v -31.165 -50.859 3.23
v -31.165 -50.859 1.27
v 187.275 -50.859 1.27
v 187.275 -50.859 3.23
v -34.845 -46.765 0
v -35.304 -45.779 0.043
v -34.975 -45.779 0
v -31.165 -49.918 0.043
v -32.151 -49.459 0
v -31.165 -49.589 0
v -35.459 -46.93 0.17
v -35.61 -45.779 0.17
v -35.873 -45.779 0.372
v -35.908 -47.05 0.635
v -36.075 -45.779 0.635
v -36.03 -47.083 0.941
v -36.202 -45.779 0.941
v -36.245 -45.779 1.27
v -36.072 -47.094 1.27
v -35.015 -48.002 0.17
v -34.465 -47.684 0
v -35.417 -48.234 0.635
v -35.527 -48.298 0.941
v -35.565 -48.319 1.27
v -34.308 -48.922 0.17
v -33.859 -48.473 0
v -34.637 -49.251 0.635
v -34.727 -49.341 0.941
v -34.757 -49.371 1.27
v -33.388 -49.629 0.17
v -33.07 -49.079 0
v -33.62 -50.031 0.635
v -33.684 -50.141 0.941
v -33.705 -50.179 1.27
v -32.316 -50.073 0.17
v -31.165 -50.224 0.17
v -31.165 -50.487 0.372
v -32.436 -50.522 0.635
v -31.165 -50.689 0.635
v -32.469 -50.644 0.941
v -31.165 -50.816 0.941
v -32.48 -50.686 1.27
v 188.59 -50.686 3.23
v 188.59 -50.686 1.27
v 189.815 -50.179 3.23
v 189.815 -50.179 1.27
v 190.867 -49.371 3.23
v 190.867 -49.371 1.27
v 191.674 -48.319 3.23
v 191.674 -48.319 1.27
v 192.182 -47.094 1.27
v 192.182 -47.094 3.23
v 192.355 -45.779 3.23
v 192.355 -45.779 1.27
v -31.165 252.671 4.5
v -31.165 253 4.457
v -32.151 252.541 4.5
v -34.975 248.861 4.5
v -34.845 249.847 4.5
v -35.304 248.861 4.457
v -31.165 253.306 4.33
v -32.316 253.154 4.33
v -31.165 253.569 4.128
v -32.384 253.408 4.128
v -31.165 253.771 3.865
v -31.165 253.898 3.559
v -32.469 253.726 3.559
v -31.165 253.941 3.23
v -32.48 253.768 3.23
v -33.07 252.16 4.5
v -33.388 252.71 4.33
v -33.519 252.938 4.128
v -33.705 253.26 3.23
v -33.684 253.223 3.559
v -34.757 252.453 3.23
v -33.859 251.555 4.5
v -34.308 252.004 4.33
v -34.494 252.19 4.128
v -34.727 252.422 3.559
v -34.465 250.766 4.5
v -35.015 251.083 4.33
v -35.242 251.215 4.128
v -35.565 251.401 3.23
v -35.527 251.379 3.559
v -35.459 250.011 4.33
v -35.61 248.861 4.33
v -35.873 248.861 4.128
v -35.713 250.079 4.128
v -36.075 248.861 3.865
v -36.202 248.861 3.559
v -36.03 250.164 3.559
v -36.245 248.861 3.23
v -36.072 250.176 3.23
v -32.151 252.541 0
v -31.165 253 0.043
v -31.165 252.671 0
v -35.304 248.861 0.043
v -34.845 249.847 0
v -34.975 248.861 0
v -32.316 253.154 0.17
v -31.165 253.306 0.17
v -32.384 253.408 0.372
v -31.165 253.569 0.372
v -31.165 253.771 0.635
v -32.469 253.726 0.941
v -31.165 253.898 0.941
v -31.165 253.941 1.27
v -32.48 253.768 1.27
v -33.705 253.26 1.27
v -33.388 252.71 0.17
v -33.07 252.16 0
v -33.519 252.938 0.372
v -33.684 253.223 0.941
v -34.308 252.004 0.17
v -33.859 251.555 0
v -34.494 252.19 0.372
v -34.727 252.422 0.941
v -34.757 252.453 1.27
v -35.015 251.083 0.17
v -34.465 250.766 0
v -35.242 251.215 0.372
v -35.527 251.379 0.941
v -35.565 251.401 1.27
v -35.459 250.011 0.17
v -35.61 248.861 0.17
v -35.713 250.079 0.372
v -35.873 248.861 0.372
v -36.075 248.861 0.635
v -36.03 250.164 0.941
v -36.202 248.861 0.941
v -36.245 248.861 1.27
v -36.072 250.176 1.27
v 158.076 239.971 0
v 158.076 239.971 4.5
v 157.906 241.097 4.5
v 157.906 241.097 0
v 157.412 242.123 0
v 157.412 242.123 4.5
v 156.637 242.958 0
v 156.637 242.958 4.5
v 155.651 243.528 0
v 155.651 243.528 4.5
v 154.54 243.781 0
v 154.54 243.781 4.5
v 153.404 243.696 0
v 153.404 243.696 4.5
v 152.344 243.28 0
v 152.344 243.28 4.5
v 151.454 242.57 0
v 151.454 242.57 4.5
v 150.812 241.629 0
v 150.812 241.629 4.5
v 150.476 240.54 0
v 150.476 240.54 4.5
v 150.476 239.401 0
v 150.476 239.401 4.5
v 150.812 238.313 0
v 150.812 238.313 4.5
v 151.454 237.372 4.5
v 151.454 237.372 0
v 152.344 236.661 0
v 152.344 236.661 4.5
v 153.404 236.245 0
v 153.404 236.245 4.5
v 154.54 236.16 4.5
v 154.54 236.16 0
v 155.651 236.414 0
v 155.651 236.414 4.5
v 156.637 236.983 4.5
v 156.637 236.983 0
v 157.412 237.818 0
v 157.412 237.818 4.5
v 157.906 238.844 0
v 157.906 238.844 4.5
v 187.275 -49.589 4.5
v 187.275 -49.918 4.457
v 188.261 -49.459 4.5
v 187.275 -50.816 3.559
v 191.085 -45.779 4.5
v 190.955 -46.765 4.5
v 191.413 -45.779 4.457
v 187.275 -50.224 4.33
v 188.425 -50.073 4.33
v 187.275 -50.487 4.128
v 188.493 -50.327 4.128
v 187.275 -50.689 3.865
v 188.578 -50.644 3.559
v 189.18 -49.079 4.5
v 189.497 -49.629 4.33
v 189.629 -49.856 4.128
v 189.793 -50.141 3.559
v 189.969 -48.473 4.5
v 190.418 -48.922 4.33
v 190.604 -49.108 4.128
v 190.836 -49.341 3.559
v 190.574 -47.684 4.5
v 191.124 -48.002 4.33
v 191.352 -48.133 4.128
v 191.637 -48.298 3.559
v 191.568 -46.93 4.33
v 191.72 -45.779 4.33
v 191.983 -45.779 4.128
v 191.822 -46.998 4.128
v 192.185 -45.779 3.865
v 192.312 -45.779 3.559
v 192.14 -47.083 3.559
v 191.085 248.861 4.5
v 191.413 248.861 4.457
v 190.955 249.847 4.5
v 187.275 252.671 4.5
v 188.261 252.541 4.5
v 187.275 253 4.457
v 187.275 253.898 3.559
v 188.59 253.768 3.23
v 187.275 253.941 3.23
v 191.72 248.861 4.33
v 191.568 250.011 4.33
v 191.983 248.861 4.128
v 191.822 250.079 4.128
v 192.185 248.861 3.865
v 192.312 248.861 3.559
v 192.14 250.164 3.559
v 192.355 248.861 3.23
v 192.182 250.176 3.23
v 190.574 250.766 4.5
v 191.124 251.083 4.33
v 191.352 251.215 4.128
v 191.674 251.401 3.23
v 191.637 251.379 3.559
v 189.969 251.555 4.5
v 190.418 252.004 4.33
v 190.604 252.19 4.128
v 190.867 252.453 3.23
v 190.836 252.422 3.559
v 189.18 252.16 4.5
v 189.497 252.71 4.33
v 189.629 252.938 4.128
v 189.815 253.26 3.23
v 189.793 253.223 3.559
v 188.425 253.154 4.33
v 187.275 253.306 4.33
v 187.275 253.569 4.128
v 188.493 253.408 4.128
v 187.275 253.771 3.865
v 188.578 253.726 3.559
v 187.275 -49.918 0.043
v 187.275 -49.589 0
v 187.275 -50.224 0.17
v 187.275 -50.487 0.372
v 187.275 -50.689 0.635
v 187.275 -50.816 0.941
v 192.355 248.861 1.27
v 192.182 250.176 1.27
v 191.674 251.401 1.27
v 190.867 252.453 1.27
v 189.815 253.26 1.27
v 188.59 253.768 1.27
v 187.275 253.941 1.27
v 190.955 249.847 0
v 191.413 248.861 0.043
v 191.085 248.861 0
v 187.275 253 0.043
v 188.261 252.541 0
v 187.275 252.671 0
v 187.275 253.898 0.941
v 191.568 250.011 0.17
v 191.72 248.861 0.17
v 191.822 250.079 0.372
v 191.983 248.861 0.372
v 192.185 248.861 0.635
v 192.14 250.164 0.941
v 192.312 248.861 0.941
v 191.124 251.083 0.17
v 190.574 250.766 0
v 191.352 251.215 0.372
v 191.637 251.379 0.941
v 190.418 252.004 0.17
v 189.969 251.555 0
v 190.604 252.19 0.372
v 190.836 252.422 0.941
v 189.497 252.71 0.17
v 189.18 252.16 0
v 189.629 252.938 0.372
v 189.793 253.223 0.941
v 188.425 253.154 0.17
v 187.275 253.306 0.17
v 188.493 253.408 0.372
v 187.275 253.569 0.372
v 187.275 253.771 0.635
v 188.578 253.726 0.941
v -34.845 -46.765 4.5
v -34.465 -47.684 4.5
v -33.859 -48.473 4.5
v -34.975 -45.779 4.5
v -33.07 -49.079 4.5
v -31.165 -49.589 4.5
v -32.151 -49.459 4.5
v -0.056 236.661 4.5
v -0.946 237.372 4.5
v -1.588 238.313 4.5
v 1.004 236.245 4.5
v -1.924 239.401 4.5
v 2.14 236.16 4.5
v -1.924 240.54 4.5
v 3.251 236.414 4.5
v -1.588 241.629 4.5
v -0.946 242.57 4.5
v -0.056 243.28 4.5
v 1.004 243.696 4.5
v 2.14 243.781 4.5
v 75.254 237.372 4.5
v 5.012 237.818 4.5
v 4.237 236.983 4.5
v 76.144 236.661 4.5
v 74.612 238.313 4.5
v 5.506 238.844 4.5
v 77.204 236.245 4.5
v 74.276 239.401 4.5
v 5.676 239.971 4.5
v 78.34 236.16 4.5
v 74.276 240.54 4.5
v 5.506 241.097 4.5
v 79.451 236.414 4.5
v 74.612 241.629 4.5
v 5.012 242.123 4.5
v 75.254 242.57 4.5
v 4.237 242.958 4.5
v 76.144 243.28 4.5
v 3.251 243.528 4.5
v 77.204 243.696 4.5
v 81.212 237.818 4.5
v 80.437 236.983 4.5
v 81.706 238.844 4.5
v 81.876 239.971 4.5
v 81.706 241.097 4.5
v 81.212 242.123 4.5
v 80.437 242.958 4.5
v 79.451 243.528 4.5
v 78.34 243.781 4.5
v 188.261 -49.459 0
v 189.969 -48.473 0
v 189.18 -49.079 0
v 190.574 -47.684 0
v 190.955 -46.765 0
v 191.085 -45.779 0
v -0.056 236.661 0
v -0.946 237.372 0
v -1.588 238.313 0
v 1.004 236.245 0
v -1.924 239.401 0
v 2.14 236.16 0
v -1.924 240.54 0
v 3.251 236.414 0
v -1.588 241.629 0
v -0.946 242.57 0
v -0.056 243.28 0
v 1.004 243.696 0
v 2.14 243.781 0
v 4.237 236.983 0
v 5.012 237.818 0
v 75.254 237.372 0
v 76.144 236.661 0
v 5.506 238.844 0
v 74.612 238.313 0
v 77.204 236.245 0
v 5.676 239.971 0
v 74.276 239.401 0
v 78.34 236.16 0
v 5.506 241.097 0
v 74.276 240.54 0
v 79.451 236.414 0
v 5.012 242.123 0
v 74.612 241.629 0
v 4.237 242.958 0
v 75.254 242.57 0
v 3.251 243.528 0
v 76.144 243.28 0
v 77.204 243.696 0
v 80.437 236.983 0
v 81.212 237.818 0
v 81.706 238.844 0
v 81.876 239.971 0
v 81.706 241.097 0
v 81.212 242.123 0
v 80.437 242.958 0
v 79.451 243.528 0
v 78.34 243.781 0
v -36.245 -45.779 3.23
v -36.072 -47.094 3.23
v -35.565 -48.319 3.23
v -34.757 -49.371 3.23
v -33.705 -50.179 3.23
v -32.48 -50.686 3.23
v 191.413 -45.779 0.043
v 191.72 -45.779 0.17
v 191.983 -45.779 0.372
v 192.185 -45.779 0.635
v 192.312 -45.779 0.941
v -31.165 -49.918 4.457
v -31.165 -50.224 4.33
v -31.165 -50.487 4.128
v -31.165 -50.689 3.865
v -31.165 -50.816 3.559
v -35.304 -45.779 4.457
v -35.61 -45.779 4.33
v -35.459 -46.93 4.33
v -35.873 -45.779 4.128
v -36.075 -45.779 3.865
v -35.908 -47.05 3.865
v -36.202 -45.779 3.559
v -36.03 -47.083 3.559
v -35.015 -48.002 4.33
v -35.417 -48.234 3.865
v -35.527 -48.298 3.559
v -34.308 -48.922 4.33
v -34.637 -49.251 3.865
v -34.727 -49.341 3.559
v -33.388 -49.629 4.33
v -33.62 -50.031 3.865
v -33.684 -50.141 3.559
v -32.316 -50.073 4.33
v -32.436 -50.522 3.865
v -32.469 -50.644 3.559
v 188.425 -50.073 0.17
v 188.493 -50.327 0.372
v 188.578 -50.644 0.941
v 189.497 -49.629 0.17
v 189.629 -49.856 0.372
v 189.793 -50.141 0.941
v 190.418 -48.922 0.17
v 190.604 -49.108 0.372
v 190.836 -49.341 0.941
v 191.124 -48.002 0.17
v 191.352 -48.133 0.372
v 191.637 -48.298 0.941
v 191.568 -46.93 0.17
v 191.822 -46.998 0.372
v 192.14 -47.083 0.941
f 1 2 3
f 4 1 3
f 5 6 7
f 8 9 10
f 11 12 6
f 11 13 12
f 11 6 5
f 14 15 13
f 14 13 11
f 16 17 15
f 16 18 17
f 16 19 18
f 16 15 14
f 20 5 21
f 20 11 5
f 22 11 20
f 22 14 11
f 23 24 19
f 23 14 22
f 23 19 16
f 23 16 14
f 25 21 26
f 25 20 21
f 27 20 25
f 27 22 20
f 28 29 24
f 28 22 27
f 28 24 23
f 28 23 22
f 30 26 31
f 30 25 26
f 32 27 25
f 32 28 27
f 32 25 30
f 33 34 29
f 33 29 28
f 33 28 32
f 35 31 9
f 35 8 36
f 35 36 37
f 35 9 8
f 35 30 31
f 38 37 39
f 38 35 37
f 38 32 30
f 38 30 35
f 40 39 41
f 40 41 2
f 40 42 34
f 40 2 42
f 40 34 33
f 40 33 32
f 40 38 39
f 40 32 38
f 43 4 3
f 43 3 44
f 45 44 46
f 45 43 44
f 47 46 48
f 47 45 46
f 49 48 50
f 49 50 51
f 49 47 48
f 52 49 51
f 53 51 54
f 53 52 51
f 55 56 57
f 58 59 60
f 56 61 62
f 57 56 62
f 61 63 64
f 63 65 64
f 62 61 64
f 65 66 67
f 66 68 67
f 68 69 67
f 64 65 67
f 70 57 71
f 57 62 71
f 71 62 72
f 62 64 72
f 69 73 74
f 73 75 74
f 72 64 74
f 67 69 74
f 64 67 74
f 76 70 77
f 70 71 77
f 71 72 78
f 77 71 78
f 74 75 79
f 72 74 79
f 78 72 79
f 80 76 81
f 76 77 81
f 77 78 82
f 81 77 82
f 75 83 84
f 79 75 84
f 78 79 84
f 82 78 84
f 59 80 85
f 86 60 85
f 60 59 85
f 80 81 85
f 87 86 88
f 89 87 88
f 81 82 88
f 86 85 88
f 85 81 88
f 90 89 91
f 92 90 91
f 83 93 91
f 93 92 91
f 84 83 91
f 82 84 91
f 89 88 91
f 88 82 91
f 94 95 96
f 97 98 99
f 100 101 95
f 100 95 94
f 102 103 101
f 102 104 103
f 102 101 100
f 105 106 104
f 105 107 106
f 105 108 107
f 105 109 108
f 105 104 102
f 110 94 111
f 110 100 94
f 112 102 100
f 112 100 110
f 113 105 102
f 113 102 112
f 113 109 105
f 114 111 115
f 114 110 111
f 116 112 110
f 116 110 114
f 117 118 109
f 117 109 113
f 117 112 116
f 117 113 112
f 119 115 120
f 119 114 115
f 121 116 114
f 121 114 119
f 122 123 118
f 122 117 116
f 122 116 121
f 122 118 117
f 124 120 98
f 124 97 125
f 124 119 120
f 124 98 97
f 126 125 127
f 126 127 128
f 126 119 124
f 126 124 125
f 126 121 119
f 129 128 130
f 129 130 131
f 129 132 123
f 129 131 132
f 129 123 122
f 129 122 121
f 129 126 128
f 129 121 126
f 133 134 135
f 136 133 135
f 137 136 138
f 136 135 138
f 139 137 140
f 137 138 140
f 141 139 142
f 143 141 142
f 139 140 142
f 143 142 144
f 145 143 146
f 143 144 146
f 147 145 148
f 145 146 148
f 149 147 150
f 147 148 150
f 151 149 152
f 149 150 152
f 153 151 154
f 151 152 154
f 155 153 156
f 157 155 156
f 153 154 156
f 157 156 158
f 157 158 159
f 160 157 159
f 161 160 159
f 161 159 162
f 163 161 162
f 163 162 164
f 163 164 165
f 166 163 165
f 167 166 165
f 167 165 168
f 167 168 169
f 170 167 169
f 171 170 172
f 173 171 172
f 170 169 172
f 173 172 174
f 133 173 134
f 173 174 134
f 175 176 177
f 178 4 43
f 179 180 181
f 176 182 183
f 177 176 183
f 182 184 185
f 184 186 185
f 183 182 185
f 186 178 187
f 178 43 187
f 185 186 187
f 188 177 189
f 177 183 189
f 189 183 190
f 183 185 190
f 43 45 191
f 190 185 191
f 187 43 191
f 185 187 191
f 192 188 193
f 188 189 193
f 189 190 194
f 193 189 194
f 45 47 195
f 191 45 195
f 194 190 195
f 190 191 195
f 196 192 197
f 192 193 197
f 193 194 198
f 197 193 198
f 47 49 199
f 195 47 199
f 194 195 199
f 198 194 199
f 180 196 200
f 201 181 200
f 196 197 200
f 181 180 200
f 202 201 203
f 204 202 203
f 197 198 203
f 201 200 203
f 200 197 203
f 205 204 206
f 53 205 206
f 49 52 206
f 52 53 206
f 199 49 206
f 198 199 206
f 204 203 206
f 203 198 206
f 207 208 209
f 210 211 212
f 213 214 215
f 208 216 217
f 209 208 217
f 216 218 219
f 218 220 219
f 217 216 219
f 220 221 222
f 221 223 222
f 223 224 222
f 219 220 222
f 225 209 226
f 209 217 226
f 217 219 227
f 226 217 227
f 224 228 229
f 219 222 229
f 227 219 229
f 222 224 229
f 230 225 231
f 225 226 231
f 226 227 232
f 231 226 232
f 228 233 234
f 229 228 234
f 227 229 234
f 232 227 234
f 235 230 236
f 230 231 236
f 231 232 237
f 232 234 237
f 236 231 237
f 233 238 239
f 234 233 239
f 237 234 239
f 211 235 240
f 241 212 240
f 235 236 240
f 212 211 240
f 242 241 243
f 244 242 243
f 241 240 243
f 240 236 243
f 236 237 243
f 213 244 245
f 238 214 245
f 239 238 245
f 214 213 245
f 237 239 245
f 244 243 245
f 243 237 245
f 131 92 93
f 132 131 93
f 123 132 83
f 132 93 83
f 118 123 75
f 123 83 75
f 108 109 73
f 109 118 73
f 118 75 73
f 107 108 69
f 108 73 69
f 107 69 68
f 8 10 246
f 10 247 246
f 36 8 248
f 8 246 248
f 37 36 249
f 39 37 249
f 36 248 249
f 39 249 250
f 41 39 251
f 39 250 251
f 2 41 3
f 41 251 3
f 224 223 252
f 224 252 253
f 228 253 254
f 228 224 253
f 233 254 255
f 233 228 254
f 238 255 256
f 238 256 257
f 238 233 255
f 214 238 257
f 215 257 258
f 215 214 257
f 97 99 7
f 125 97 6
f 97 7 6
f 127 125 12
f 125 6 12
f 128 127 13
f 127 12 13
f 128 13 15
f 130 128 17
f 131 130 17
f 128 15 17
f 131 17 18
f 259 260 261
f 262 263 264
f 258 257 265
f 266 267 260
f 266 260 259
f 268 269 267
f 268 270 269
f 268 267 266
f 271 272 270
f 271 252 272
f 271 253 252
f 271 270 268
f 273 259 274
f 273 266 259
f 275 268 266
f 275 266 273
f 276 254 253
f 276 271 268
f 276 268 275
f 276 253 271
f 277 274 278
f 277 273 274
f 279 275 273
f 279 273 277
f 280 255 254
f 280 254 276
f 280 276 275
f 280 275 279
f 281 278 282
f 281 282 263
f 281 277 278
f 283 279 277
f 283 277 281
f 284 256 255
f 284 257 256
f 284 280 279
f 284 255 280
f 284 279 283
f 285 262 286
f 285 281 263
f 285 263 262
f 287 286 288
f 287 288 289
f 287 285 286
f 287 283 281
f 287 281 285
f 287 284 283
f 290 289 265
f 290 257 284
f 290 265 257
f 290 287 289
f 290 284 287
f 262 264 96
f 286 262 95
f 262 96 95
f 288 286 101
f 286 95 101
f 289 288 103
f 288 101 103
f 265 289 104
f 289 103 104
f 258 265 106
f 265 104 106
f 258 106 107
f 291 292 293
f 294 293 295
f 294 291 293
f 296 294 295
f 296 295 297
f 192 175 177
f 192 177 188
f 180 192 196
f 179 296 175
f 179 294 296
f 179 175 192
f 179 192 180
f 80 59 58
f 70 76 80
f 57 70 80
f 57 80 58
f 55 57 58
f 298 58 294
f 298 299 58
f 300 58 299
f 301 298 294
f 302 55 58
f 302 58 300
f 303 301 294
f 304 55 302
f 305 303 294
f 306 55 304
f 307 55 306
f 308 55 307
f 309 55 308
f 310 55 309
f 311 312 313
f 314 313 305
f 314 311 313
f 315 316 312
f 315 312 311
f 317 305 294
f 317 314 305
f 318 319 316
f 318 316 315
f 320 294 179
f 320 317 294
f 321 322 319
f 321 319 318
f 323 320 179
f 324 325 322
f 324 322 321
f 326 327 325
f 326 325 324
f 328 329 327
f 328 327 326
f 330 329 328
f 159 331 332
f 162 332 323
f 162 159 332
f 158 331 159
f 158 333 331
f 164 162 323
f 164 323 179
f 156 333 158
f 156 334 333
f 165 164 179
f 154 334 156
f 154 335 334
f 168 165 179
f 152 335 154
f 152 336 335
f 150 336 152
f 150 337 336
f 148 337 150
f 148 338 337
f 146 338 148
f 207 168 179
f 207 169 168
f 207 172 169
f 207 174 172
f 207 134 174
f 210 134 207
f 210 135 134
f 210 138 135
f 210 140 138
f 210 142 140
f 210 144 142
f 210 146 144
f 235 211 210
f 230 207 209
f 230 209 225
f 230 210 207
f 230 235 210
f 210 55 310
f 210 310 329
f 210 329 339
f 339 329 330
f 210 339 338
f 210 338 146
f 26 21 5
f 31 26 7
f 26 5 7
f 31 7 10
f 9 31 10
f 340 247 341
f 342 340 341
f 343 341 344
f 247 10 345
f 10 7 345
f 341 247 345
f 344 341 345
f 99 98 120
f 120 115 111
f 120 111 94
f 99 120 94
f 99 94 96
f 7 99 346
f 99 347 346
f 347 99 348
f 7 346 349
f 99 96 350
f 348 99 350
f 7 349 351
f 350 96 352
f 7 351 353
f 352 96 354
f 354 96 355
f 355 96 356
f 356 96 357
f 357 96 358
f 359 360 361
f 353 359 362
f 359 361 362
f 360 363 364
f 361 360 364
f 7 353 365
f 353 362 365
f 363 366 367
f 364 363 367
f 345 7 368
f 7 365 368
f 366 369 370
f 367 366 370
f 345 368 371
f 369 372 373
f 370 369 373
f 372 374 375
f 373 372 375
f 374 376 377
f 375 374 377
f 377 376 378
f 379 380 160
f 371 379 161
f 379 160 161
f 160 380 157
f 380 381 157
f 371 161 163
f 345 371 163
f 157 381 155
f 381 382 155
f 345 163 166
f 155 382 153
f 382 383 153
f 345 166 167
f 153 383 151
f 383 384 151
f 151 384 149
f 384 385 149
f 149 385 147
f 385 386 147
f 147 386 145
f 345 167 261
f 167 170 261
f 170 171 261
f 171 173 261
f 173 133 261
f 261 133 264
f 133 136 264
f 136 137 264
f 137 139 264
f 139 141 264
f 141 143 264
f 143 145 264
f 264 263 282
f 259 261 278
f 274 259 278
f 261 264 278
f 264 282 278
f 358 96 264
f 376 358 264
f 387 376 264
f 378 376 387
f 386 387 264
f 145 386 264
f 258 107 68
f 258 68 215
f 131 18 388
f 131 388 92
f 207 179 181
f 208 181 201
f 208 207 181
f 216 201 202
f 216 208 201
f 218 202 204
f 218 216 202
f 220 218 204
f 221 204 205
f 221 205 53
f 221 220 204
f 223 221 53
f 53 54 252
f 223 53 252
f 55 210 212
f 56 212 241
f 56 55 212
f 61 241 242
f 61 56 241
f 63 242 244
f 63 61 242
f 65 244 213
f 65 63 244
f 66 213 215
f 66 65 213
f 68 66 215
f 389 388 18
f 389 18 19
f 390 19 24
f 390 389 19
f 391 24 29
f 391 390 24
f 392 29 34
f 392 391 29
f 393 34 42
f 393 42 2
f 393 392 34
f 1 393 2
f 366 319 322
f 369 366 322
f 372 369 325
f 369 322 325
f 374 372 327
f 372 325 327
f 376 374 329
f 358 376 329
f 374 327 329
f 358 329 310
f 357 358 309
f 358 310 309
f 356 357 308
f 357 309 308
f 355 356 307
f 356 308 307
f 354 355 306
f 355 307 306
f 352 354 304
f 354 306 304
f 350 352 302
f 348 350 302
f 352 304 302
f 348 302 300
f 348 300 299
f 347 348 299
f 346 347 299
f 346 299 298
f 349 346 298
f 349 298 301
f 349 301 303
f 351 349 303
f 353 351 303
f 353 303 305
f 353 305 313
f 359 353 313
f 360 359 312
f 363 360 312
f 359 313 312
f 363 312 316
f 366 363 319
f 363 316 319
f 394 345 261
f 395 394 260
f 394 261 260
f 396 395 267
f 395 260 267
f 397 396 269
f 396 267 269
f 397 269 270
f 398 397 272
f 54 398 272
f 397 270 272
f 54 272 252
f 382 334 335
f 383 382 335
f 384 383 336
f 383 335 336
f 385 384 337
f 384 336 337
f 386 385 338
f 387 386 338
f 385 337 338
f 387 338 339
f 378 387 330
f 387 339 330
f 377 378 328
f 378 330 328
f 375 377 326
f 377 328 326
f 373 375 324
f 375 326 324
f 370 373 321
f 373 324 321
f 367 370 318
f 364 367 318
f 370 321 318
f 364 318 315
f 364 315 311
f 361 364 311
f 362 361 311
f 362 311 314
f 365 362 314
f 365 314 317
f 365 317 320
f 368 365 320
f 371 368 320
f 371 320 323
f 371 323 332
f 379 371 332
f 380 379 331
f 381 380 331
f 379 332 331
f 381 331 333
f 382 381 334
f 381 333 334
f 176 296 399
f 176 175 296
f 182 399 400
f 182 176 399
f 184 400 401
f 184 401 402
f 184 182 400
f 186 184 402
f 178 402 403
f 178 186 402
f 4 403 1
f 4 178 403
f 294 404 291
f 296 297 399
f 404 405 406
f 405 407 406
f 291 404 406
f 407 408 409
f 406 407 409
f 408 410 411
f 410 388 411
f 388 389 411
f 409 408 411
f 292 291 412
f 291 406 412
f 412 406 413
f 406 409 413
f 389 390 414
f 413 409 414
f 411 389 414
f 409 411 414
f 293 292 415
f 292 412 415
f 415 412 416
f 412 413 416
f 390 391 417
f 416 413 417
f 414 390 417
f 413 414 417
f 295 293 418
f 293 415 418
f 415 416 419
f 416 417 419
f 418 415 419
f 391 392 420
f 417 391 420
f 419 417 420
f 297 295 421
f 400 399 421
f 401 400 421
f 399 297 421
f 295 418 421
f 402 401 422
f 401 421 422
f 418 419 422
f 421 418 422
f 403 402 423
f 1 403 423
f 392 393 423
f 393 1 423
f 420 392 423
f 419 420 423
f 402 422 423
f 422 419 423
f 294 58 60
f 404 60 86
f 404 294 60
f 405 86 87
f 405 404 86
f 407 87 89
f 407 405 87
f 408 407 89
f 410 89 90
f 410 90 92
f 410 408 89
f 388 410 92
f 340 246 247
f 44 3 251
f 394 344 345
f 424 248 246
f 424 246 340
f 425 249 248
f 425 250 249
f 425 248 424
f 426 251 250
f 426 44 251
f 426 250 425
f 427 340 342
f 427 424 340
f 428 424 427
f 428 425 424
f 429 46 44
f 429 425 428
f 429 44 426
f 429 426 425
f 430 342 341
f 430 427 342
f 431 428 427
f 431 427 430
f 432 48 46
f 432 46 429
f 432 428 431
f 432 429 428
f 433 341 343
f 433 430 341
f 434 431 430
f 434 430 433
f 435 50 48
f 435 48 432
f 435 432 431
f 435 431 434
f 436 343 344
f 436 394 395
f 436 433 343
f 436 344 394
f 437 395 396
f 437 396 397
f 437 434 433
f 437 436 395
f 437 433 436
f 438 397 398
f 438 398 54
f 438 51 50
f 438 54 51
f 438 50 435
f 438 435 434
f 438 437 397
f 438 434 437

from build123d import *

# Parameters (mm, degrees)
F0_W     = 228.6
F0_H     = 304.8
F1_DEPTH = 4.5
F2_R     = 5.08
F3_R     = 1.27
F4_R     = 3.821327
F5_DEPTH = 4.5


with BuildPart() as f1:
    # F0 (on Top) → F1 (new body)
    with BuildSketch(Plane.XY):
        with Locations((78.054795, 101.540847)):
            Rectangle(F0_W, F0_H)
    extrude(amount=F1_DEPTH)

    # F2
    f2_edges = [f1.edges().sort_by_distance(p)[0] for p in [
        (-36.245205, 253.940847, 2.25),
        (192.354795, 253.940847, 2.25),
        (-36.245205, -50.859153, 2.25),
        (192.354795, -50.859153, 2.25),
    ]]
    fillet(f2_edges, radius=F2_R)

    # F3
    f3_edges = [f1.edges().sort_by_distance(p)[0] for p in [
        (78.054795, -50.859153, 0),
        (-31.165205, -50.859153, 2.25),
        (187.274795, -50.859153, 2.25),
        (78.054795, -50.859153, 4.5),
    ]]
    fillet(f3_edges, radius=F3_R)

    # F4 (on face) → F5 (cut)
    with BuildSketch(Plane.XY.offset(4.5)):
        with Locations((1.854795, 239.970847)):
            Circle(F4_R)
        with Locations((78.054795, 239.970847)):
            Circle(F4_R)
        with Locations((154.254795, 239.970847)):
            Circle(F4_R)
    extrude(amount=-F5_DEPTH, mode=Mode.SUBTRACT)


solid = f1.part
